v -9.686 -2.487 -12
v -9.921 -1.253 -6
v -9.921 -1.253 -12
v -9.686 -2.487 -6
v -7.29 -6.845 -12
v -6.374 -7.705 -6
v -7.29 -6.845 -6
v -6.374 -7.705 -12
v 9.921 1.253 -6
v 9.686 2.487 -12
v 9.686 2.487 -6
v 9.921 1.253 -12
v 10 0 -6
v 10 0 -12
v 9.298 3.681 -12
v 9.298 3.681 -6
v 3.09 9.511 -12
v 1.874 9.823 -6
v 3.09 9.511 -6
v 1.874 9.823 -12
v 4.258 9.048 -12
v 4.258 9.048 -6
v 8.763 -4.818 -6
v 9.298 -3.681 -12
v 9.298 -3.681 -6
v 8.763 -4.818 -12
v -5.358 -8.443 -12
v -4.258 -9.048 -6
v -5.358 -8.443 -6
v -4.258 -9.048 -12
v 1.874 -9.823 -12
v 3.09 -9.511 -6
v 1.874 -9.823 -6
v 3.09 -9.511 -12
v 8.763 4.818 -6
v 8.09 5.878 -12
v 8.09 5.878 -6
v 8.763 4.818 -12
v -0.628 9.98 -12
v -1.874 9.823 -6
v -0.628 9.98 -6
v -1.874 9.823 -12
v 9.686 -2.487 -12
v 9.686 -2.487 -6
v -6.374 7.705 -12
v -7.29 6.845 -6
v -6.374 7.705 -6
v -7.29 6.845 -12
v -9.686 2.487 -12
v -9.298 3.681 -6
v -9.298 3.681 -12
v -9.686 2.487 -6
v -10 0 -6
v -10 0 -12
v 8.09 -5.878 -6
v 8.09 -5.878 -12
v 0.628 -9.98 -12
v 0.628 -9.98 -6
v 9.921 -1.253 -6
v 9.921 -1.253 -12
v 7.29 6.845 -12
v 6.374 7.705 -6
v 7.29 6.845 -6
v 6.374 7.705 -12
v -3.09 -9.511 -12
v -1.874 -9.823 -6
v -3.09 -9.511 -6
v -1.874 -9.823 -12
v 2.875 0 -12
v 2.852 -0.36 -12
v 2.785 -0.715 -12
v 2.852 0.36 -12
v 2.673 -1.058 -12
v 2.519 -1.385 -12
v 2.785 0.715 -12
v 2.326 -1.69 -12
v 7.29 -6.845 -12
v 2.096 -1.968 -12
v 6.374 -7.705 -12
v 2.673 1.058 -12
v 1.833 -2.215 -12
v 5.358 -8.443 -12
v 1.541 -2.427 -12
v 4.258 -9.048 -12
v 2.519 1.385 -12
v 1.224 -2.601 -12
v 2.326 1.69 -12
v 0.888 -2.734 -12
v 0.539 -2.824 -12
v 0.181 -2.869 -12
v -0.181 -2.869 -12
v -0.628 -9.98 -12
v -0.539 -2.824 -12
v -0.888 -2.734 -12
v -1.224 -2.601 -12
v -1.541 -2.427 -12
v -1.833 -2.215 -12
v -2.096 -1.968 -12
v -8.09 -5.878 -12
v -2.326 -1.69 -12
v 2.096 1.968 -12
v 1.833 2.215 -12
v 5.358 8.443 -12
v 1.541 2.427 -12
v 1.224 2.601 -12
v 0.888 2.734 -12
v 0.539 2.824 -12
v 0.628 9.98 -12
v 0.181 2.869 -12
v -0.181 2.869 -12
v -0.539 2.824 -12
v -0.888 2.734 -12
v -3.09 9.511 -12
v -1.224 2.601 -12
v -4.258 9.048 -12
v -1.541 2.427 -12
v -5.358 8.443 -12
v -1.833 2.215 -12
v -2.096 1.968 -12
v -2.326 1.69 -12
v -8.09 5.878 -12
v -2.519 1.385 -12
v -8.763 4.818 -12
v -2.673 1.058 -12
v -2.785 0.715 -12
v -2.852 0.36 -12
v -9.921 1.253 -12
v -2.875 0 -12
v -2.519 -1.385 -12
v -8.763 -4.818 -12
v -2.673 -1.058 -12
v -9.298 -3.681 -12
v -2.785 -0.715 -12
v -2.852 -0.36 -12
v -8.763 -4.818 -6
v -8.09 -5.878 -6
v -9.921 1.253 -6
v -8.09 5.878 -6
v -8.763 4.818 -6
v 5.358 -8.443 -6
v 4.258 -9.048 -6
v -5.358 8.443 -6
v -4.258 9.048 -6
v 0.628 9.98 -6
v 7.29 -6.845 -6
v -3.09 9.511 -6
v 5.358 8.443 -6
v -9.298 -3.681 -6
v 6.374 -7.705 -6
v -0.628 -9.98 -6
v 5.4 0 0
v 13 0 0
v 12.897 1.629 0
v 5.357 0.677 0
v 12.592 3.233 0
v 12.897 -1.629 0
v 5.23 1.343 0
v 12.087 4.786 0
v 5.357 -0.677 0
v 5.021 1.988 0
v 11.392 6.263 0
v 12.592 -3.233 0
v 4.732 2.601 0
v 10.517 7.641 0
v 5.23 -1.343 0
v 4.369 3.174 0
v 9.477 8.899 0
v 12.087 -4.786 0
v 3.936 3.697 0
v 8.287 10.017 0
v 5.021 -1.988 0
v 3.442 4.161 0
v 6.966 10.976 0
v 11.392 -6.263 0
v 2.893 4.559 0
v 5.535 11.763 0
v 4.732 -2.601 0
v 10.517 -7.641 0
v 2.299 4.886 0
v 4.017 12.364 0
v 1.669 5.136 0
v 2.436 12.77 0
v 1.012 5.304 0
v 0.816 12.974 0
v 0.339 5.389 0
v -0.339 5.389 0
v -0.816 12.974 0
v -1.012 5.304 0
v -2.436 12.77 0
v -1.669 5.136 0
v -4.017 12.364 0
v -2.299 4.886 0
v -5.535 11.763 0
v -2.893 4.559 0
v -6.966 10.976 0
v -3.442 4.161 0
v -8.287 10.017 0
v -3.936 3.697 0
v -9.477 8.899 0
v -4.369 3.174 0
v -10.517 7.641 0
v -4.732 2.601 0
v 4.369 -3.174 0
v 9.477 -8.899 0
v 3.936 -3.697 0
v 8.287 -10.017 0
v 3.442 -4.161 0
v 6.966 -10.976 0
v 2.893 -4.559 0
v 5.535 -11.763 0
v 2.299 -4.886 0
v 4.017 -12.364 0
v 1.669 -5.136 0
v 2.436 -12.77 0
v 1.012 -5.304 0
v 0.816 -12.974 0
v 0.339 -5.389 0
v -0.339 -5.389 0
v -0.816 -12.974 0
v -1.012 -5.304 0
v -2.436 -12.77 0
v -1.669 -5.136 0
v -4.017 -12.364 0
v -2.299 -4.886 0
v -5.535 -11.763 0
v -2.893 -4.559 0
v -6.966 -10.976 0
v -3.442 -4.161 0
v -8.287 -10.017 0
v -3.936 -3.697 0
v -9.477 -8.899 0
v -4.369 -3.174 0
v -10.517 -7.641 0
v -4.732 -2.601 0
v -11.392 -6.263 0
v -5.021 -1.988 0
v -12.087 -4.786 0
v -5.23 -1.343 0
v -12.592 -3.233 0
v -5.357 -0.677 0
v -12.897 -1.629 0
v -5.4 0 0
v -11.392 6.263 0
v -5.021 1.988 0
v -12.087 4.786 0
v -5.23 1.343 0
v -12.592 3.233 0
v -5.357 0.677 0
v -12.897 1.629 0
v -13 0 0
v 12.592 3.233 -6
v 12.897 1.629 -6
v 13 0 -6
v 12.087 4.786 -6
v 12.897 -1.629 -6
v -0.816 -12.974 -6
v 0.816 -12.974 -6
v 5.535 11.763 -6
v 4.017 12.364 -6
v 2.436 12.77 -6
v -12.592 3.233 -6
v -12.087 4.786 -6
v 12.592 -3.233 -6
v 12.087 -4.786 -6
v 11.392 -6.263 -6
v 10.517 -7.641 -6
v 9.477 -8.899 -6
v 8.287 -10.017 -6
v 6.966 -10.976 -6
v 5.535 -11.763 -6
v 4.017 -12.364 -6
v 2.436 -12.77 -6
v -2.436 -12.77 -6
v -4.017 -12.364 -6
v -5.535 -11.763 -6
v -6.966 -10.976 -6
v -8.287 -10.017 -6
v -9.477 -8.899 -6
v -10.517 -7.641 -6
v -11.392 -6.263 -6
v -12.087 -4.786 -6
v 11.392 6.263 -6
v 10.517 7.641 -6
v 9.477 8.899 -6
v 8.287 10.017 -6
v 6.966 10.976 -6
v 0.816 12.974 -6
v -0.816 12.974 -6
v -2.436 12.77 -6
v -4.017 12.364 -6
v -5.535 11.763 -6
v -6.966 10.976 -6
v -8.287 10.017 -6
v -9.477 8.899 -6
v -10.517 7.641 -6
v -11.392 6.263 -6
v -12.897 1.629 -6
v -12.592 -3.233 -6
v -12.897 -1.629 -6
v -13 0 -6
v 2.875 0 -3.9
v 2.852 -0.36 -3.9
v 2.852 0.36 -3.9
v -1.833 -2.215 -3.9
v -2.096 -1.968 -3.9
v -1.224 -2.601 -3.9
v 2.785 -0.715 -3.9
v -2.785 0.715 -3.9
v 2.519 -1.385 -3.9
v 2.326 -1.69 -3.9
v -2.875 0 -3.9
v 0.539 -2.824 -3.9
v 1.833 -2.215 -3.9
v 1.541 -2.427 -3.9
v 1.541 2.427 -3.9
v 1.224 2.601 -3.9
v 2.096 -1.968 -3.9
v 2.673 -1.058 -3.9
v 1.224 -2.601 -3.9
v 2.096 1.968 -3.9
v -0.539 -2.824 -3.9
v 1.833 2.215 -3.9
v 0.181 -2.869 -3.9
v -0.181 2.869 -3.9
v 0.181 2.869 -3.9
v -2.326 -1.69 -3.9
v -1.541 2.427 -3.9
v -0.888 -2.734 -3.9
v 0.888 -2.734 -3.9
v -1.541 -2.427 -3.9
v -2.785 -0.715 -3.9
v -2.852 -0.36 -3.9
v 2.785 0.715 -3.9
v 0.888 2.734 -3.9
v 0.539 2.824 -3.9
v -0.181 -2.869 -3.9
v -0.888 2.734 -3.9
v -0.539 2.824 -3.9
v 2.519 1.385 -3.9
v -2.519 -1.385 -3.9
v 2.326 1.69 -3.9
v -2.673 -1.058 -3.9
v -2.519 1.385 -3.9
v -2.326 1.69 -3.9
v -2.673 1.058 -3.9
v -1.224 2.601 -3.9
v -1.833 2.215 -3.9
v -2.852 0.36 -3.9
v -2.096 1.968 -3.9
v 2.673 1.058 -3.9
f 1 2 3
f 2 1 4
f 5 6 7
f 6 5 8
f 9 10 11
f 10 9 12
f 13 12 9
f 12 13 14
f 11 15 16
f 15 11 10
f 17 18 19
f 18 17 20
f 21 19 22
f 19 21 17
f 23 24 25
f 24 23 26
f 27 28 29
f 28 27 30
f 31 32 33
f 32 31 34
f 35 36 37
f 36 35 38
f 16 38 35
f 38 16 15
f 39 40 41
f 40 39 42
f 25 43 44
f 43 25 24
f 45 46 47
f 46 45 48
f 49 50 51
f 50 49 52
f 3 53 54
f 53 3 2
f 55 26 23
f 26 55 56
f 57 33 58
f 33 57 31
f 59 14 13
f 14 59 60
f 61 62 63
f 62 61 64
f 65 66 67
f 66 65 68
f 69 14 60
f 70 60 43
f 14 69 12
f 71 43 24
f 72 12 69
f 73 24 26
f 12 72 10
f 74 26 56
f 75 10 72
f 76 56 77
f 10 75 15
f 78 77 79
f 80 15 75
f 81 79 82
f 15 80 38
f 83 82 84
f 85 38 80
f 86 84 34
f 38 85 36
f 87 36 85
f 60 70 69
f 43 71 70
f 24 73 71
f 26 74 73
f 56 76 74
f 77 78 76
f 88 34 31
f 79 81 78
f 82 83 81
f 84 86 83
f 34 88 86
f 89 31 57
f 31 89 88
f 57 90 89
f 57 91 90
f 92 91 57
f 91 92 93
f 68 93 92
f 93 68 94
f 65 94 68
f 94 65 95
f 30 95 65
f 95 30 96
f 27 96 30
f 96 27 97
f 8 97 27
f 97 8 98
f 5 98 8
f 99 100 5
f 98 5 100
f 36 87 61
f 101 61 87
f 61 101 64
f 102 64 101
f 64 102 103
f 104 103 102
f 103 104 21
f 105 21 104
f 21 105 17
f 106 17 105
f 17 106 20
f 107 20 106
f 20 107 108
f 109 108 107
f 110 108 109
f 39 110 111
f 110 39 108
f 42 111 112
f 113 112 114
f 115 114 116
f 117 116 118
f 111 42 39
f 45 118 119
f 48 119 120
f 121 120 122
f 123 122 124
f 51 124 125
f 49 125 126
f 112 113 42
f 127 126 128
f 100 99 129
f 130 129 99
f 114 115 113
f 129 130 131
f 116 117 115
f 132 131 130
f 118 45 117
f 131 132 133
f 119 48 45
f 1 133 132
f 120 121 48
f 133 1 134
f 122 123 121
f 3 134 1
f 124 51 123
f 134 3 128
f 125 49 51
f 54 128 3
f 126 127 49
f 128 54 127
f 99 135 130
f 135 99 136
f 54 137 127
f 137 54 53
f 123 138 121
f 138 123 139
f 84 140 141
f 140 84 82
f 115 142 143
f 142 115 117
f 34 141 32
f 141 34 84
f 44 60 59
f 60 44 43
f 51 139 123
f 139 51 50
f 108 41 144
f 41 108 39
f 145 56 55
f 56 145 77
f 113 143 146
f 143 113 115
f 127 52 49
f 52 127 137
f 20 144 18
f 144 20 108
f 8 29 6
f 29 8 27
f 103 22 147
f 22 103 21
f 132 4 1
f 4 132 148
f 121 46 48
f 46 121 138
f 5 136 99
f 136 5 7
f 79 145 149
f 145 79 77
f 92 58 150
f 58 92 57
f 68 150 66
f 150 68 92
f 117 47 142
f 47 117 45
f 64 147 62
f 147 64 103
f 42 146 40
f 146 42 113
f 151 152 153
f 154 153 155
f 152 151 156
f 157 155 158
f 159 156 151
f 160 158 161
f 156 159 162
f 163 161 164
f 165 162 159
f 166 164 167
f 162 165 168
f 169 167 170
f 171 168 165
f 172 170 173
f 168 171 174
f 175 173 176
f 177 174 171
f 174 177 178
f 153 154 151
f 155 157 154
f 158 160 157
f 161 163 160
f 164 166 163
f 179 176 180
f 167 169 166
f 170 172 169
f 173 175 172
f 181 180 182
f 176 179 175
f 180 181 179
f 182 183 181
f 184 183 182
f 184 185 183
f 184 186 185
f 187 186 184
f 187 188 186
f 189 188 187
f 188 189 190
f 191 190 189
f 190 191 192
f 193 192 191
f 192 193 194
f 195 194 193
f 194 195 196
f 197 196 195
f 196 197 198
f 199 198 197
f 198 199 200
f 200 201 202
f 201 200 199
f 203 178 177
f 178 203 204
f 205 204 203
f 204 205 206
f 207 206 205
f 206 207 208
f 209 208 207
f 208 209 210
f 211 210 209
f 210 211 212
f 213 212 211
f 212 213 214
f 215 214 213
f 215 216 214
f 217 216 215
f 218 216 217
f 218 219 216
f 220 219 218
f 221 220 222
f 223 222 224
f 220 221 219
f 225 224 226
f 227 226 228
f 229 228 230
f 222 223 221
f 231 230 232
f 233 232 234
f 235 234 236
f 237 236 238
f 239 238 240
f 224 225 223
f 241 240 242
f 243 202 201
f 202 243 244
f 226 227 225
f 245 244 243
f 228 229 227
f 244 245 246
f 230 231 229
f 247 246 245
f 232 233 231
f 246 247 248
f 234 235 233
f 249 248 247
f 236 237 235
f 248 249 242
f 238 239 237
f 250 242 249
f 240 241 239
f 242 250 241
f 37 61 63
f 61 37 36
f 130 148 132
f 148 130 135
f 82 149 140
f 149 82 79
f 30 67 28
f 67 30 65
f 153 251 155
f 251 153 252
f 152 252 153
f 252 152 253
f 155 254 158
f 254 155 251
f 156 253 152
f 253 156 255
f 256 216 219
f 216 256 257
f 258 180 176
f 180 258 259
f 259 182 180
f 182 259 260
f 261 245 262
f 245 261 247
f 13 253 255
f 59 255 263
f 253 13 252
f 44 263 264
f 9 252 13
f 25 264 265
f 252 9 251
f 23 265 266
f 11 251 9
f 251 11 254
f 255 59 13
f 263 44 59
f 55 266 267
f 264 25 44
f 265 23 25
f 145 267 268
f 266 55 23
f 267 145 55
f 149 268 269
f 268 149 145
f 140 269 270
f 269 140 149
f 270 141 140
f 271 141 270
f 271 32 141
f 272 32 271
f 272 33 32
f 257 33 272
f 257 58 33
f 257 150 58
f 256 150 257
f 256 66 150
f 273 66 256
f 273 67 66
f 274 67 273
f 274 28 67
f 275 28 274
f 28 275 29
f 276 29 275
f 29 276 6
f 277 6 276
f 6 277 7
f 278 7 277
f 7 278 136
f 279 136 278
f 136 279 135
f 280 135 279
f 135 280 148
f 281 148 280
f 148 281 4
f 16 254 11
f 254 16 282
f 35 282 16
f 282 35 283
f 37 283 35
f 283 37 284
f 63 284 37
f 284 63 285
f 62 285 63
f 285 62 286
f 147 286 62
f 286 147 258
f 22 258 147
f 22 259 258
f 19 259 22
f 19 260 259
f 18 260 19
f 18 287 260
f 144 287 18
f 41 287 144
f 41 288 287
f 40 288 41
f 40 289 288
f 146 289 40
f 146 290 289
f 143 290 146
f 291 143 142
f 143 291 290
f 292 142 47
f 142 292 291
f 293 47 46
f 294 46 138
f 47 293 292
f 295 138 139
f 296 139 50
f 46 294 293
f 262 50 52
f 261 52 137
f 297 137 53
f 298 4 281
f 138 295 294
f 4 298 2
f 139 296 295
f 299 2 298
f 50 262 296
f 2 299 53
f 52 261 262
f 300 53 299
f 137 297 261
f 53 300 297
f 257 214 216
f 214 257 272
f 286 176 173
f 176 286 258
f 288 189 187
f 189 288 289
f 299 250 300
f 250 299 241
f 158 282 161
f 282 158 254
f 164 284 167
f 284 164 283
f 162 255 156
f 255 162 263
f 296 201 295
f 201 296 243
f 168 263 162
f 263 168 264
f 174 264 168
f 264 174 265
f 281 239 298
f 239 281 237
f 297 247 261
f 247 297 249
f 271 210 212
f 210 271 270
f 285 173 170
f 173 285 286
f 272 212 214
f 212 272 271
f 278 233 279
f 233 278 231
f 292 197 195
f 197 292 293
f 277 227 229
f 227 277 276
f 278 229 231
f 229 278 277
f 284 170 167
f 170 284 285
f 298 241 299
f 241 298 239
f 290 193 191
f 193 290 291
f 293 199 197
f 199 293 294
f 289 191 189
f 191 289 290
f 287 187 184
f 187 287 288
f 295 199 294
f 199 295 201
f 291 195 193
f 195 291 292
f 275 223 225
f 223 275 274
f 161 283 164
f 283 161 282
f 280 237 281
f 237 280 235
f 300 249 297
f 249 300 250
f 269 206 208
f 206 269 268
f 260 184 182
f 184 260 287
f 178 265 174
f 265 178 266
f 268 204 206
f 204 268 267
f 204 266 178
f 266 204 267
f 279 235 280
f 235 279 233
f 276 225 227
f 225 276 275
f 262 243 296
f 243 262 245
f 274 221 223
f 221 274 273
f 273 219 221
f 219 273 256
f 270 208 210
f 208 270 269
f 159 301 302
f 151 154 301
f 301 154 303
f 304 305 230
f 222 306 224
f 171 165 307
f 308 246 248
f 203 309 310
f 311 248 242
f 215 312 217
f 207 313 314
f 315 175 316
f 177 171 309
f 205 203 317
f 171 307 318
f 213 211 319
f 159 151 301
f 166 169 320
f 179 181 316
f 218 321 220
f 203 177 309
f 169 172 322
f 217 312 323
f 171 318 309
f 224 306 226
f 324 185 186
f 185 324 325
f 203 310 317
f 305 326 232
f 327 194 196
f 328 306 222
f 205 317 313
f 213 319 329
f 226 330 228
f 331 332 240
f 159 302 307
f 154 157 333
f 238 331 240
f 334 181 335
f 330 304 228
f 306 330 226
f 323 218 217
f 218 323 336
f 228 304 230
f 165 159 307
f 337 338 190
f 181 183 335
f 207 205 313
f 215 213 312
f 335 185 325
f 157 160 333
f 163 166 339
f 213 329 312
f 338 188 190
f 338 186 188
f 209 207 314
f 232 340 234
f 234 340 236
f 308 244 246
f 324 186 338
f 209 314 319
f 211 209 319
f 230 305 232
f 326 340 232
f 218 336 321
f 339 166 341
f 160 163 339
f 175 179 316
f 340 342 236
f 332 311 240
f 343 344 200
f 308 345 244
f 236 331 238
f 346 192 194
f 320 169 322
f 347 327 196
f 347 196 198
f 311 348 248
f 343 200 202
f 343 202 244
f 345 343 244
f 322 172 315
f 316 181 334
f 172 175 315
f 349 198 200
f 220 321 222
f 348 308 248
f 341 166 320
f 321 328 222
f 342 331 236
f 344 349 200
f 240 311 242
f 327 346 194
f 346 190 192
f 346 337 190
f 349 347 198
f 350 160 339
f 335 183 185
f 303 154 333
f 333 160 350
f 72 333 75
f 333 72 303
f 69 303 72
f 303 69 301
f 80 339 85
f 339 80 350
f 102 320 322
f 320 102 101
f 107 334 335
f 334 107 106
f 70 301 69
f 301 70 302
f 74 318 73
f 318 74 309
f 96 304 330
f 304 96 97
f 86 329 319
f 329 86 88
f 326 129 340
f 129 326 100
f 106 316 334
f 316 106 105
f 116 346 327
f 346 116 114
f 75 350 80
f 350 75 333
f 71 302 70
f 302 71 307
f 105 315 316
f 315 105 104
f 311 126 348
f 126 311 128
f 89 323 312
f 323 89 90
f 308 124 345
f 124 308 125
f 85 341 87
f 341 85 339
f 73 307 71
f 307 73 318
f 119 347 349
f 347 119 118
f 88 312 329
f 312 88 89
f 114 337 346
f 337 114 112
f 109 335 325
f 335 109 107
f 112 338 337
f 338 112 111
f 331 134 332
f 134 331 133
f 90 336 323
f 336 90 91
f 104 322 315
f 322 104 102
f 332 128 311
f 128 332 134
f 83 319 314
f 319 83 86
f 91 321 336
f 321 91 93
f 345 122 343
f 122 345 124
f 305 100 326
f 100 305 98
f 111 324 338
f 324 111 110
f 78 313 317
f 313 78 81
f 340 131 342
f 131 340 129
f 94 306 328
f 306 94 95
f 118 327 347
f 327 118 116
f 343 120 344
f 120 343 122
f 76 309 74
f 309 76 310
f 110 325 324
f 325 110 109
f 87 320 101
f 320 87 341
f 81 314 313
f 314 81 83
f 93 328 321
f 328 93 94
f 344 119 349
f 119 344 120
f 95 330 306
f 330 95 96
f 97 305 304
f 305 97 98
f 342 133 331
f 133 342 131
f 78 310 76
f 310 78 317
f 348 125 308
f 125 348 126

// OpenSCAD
$fn = 50;


difference() {
	union() {
		translate(v = [0, 0, -12.0000000000]) {
			cylinder(h = 12, r = 10.0000000000);
		}
		translate(v = [0, 0, -6.0000000000]) {
			cylinder(h = 6, r = 13.0000000000);
		}
	}
	union() {
		translate(v = [0, 0, 0]) {
			rotate(a = [0, 0, 0]) {
				difference() {
					union() {
						#translate(v = [0, 0, -12.0000000000]) {
							cylinder(h = 12, r = 2.6000000000);
						}
						#translate(v = [0, 0, -3.9000000000]) {
							cylinder(h = 3.9000000000, r1 = 2.8750000000, r2 = 5.4000000000);
						}
						#translate(v = [0, 0, -12.0000000000]) {
							cylinder(h = 12, r = 2.8750000000);
						}
						#translate(v = [0, 0, -12.0000000000]) {
							cylinder(h = 12, r = 2.6000000000);
						}
					}
					union();
				}
			}
		}
	}
}
